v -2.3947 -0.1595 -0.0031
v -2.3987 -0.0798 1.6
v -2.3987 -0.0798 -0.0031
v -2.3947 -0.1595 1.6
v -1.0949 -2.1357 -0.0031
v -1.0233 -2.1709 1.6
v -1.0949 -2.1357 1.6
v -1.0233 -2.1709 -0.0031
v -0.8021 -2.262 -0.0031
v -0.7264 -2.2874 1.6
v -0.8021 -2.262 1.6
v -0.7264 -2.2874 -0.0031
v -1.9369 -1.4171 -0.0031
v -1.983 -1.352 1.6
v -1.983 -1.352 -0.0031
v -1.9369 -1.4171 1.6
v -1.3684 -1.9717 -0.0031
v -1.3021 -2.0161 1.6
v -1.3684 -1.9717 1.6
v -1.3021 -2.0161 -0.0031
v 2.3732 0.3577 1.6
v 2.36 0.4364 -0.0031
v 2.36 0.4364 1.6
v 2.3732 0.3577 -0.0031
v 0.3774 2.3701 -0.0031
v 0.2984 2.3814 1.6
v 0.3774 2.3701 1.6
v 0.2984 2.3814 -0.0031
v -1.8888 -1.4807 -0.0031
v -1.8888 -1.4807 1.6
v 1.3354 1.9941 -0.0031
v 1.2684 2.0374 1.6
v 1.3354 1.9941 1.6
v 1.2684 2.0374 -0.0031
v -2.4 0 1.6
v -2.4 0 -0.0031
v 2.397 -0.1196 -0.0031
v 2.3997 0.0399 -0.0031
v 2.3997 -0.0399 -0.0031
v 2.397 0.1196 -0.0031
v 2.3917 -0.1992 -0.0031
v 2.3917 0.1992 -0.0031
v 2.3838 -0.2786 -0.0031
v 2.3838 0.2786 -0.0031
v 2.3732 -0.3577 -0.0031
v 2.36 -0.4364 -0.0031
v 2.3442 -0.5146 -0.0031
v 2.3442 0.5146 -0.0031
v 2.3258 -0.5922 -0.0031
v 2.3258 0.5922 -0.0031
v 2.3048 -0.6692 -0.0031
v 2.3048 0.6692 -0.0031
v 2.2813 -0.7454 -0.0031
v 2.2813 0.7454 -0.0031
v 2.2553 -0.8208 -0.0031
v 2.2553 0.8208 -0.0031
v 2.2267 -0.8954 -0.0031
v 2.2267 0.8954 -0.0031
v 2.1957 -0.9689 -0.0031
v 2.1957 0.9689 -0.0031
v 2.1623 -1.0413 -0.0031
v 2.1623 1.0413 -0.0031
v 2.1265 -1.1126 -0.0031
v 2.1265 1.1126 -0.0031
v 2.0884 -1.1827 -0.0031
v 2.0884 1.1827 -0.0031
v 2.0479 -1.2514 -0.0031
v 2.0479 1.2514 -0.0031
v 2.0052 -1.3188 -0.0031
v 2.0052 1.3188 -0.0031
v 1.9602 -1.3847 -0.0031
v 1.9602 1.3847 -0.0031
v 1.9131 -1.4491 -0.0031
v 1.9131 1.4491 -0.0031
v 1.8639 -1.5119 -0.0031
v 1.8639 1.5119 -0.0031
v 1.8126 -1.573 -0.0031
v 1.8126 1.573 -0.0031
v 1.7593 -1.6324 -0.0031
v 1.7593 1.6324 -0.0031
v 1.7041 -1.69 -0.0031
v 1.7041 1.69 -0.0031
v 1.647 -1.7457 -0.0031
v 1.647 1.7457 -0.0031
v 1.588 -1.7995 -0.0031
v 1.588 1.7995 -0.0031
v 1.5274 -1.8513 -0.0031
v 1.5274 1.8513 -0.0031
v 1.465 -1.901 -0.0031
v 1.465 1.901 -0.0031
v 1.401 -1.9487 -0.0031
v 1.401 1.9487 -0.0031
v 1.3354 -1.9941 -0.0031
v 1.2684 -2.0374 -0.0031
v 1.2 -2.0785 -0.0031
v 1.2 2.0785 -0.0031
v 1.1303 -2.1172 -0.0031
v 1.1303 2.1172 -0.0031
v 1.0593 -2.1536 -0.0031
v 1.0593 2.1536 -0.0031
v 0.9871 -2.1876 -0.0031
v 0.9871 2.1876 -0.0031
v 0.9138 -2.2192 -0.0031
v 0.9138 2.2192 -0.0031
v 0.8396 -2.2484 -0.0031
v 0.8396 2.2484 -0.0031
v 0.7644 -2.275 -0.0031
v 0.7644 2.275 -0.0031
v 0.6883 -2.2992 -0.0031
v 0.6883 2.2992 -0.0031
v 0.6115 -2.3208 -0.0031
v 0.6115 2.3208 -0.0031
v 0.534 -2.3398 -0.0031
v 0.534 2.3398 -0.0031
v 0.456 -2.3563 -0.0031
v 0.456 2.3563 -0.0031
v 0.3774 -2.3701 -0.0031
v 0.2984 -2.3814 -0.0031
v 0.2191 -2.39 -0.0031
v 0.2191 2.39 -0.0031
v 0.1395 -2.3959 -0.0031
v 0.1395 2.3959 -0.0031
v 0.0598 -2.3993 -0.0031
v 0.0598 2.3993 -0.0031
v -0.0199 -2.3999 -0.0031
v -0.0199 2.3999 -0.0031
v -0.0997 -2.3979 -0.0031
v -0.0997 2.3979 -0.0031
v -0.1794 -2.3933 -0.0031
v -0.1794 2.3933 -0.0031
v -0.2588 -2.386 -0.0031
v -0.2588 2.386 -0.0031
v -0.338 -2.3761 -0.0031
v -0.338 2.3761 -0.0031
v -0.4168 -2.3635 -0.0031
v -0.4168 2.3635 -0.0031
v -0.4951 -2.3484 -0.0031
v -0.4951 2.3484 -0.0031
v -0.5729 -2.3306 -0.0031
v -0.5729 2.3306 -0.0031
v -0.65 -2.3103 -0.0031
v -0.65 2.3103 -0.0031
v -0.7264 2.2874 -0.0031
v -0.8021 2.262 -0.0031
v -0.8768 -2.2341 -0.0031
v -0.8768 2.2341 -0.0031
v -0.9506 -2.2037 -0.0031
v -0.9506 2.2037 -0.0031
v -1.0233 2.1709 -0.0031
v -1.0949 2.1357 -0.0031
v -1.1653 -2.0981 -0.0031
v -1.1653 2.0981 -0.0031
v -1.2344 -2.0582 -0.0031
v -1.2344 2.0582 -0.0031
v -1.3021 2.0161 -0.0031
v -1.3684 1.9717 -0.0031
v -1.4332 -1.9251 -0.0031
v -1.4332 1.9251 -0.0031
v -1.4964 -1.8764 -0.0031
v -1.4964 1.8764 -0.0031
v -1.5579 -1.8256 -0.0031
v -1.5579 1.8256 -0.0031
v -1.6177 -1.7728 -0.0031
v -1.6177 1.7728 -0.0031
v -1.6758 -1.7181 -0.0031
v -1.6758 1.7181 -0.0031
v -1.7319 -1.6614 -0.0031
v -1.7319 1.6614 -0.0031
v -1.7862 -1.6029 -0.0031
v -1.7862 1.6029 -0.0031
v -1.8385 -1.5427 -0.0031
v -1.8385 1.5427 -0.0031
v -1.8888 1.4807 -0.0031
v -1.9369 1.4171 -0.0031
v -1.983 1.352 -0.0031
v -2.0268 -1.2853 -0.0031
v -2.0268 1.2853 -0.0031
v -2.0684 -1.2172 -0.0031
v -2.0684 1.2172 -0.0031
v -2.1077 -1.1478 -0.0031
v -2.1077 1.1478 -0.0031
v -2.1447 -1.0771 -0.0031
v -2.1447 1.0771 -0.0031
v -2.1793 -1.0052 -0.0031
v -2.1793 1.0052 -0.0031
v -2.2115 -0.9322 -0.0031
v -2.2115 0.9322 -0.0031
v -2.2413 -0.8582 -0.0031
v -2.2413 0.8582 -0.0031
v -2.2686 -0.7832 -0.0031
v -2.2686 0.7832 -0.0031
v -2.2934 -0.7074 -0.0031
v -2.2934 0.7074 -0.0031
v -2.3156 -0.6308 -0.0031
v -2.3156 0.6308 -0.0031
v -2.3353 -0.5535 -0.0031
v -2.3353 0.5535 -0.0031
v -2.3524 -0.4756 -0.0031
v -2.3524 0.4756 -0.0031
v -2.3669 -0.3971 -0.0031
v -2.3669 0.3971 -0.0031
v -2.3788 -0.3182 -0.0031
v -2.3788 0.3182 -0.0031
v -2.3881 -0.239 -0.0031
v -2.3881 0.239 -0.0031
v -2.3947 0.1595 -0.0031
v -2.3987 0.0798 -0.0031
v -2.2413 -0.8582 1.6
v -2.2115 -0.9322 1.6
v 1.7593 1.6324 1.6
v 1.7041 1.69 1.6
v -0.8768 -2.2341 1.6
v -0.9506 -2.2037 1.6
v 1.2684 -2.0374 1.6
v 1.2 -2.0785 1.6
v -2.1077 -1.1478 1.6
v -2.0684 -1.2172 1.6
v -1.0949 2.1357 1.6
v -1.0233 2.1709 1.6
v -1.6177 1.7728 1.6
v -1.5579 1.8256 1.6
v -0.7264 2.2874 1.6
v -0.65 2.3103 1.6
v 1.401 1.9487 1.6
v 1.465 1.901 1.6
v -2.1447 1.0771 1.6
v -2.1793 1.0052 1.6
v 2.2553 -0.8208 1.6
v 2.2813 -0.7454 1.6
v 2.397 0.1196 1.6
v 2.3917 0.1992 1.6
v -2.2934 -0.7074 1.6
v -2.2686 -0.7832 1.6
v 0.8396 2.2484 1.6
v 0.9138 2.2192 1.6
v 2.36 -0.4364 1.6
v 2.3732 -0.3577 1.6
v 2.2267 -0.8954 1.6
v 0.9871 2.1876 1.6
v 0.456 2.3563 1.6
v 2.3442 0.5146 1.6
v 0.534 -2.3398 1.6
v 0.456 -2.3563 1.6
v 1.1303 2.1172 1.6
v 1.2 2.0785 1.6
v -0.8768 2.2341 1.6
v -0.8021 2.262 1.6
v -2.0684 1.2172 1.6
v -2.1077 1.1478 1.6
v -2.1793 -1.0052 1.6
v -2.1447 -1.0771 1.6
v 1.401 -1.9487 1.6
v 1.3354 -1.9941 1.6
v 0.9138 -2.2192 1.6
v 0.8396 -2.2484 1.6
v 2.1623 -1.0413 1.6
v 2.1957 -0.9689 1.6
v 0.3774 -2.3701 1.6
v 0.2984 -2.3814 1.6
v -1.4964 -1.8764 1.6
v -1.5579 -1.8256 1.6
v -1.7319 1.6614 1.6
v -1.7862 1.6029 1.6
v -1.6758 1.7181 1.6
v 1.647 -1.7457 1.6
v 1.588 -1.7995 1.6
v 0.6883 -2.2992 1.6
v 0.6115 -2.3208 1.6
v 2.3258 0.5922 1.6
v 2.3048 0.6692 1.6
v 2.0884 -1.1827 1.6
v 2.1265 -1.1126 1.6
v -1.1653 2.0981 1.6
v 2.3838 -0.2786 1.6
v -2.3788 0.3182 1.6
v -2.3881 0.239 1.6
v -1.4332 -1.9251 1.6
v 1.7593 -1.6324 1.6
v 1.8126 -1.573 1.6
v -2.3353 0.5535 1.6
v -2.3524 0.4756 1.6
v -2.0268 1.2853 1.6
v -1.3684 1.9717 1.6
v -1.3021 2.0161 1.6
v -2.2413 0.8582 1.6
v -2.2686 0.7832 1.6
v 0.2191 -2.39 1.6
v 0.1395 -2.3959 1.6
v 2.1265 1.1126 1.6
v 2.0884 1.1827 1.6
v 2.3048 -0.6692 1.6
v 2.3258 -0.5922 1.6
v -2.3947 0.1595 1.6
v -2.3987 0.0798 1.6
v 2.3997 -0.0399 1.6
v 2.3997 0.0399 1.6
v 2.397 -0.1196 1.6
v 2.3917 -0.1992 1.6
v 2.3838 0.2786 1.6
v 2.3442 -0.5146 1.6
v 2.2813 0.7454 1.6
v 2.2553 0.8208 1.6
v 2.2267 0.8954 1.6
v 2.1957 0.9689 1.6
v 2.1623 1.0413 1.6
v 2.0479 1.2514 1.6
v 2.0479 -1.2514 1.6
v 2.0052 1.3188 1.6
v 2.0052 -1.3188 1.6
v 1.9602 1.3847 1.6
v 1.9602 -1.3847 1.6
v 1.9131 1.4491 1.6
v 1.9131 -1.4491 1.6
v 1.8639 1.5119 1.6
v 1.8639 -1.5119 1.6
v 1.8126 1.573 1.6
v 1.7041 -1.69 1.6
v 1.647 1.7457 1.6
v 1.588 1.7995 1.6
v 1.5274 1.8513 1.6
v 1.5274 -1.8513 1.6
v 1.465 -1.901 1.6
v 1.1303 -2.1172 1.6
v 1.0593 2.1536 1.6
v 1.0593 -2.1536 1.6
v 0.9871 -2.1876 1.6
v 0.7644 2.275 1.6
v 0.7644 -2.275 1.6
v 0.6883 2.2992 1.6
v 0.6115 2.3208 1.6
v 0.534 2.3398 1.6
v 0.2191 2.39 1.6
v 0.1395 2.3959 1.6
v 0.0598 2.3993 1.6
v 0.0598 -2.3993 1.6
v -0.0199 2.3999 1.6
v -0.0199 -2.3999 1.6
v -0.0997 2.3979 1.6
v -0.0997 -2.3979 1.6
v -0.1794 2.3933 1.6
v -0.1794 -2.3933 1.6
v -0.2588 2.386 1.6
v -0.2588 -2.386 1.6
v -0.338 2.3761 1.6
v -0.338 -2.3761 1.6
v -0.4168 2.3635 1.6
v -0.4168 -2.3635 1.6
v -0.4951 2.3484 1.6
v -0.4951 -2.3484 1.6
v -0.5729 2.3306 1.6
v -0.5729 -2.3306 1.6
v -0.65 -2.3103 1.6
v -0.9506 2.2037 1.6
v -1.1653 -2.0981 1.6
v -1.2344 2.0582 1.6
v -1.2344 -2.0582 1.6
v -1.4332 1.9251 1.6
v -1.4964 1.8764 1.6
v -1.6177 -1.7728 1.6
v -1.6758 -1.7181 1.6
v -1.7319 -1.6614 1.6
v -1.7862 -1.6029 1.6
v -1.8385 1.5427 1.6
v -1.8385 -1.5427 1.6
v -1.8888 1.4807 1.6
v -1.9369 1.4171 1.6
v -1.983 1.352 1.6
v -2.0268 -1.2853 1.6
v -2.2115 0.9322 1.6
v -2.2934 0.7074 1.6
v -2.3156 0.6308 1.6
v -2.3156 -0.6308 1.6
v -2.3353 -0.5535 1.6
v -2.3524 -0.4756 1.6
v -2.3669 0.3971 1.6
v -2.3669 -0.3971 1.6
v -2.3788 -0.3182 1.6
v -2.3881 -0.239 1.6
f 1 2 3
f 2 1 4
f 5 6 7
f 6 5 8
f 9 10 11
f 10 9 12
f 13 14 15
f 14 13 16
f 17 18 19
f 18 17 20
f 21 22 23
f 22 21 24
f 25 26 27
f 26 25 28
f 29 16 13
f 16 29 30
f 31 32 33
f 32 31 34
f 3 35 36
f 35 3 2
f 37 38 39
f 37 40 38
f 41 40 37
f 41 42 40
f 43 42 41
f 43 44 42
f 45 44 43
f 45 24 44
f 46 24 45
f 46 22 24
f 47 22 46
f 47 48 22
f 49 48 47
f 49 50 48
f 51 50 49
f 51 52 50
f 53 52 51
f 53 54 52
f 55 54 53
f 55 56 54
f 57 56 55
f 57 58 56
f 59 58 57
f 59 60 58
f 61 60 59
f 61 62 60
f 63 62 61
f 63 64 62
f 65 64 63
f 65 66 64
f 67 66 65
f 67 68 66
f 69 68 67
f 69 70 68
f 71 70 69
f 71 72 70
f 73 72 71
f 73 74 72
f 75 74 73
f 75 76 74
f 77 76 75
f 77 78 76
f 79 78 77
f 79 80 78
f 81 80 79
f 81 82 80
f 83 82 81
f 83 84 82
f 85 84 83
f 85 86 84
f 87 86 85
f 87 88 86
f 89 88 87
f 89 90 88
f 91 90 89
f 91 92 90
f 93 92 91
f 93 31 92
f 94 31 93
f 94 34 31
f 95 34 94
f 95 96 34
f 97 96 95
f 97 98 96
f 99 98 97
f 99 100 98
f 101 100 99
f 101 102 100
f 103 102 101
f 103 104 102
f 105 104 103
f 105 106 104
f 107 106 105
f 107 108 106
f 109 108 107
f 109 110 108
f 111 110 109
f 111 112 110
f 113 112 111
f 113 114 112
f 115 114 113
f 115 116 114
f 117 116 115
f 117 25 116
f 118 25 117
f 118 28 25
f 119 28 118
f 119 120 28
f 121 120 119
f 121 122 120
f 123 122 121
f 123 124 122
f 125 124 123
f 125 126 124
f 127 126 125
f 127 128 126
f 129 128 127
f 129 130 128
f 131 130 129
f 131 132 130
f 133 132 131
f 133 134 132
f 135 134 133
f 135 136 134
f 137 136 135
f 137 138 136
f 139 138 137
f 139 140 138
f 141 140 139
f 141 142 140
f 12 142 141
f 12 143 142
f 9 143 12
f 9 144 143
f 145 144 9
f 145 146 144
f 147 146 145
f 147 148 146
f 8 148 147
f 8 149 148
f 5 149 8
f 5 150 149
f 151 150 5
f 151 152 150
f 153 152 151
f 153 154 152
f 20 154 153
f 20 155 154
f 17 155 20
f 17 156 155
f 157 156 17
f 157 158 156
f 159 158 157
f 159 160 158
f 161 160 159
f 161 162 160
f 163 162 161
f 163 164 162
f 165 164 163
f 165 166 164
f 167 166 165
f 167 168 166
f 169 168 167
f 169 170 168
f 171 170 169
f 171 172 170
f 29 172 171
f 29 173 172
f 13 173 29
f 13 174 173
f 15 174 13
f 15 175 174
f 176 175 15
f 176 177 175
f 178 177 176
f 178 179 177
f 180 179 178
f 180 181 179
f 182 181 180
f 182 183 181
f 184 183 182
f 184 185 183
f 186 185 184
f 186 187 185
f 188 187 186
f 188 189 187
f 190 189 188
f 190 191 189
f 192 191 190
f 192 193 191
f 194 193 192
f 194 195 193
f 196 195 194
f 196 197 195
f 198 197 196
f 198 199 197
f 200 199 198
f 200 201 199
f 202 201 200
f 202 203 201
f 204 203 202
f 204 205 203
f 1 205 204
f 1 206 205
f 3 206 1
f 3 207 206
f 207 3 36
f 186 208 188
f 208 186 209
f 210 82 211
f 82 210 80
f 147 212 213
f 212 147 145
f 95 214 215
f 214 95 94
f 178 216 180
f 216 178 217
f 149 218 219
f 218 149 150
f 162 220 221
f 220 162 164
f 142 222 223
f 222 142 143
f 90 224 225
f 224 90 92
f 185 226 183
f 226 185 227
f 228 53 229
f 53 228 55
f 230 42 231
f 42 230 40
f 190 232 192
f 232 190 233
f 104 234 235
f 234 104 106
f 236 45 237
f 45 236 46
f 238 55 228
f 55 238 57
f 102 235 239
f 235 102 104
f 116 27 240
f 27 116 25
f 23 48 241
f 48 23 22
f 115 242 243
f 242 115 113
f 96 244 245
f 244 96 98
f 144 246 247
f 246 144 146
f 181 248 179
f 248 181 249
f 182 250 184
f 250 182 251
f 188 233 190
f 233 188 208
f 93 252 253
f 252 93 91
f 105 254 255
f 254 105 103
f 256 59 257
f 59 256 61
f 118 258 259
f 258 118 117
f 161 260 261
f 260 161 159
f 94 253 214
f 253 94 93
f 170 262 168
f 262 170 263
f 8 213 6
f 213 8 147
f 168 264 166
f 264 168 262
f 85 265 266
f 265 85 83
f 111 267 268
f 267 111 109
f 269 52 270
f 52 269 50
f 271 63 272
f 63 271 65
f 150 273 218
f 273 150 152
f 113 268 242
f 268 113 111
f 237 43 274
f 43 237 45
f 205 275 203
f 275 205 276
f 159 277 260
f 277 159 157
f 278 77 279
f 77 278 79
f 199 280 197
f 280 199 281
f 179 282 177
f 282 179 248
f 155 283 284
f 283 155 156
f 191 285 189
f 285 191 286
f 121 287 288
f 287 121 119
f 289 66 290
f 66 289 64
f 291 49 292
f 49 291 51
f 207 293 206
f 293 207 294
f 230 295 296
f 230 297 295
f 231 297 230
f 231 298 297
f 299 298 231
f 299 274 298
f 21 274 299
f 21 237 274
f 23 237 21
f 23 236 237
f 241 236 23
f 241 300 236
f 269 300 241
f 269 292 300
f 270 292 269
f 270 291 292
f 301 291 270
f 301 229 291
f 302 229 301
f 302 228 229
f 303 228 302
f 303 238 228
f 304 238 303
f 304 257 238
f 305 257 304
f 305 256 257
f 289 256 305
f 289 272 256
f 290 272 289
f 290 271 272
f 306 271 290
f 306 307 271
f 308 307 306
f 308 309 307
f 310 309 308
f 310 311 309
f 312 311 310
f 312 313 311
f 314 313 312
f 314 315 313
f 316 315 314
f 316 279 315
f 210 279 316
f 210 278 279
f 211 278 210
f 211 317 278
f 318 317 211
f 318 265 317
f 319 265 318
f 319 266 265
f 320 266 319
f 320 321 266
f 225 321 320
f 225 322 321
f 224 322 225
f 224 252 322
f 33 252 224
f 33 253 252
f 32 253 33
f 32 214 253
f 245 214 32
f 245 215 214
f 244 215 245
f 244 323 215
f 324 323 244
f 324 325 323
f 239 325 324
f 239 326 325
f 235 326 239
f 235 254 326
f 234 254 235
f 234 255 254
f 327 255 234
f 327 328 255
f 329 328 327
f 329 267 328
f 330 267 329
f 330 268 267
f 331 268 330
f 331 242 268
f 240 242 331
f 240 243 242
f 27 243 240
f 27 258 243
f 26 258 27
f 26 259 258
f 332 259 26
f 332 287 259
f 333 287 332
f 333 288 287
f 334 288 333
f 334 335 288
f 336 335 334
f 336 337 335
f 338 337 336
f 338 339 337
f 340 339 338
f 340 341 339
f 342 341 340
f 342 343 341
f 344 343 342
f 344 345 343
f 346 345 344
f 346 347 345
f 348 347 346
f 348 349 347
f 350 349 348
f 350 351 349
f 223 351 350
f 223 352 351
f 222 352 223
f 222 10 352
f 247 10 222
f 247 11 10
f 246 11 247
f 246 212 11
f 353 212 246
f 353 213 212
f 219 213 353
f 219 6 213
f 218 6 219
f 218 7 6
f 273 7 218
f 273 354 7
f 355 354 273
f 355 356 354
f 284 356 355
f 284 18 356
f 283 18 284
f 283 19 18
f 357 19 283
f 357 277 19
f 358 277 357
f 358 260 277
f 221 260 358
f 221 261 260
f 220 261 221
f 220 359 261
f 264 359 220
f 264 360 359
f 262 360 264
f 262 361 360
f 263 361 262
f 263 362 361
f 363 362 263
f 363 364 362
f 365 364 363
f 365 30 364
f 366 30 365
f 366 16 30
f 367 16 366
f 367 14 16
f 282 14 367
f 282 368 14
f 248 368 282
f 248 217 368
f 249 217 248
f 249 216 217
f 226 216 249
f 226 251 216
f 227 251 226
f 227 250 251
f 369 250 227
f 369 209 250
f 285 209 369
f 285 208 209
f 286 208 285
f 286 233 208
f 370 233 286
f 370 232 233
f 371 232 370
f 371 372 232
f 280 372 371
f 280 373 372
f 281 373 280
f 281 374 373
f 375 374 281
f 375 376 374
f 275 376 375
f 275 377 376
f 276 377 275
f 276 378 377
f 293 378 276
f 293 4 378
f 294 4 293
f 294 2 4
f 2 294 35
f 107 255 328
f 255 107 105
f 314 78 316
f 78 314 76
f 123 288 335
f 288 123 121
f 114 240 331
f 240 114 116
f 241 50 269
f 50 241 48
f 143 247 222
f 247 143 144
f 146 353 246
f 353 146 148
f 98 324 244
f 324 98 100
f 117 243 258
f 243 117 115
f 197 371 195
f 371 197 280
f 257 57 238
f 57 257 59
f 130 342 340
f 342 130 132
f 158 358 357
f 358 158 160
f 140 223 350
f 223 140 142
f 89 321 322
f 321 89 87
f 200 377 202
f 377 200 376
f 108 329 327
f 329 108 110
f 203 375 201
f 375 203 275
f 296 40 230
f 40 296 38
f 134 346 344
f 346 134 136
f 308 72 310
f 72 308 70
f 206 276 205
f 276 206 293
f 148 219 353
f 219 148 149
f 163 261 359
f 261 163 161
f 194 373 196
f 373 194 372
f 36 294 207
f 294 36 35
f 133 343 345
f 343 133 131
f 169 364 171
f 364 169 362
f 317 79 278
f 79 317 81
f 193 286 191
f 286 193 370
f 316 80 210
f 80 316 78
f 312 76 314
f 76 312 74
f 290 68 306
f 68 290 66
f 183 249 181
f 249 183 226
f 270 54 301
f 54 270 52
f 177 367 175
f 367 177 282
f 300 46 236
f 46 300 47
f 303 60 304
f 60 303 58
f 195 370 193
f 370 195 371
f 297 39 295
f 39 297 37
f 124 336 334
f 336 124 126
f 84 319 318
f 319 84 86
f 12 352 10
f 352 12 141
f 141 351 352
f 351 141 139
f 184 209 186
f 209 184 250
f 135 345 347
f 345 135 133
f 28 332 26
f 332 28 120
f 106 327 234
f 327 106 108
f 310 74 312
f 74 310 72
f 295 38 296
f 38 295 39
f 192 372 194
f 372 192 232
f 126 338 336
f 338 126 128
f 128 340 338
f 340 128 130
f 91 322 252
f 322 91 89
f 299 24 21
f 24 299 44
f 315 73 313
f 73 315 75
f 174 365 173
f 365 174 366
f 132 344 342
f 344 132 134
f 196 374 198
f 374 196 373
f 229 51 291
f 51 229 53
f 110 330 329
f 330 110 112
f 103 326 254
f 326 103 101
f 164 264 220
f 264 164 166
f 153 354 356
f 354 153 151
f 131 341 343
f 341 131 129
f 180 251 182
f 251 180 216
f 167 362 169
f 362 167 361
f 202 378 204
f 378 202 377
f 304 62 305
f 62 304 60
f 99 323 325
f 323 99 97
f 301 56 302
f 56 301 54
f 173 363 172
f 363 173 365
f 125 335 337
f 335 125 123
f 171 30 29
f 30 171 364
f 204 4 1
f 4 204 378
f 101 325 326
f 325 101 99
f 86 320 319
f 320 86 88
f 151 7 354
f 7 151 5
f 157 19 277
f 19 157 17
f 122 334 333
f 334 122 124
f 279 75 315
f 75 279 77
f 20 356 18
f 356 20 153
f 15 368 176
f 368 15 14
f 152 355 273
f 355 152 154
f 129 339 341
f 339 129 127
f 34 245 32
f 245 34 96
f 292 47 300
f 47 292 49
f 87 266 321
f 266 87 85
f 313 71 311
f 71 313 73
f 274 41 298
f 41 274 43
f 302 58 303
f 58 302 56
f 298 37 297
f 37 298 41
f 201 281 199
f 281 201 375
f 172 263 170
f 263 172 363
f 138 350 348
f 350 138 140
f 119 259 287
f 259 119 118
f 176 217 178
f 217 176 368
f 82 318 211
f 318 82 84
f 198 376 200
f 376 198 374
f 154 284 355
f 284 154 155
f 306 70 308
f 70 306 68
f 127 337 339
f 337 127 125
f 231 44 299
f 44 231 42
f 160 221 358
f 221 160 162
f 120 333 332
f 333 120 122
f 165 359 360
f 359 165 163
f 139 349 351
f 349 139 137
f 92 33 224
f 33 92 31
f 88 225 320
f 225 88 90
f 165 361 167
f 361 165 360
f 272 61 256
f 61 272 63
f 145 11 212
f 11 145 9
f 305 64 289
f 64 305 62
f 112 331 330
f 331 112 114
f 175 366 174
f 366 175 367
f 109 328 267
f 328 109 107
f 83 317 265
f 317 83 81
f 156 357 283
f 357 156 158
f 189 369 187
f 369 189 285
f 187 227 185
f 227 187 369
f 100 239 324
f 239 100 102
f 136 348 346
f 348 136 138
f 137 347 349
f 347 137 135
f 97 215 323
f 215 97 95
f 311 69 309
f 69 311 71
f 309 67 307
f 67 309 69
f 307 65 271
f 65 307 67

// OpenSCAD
// file: ../p/stud3.scad
use <../lib.scad>
use <4-4cyli.scad>
use <4-4disc.scad>
use <4-4edge.scad>
$fa=1; $fs=0.2;
function ldraw_lib__stud3(realsolid=false) = realsolid ? 
    [openscad(translate([0,0,-eps()], o=cylinder(4+eps(), r=4)),2)] : [
// 0 Stud Tube Solid
// 0 Name: stud3.dat
// 0 Author: James Jessiman
// 0 !LDRAW_ORG Primitive UPDATE 2012-01
// 0 !LICENSE Licensed under CC BY 2.0 and CC BY 4.0 : see CAreadme.txt
// 
// 0 BFC CERTIFY CCW
  [0,"BFC","CERTIFY"],
  [0,"BFC","CCW"],
// 
// 0 !HISTORY 2002-04-04 [sbliss] Modified for BFC compliance
// 0 !HISTORY 2002-04-25 [PTadmin] Official Update 2002-02
// 0 !HISTORY 2007-06-24 [PTadmin] Header formatted for Contributor Agreement
// 0 !HISTORY 2008-07-01 [PTadmin] Official Update 2008-01
// 0 !HISTORY 2012-02-16 [Philo] Changed to CCW
// 0 !HISTORY 2012-03-30 [PTadmin] Official Update 2012-01
// 
// 
// 1 16 0 -4 0 4 0 0 0 1 0 0 0 4 4-4edge.dat
  [1,16,0,-4,0,4,0,0,0,1,0,0,0,4, ldraw_lib__4_4edge(realsolid)],
// 1 16 0 0 0 4 0 0 0 1 0 0 0 4 4-4edge.dat
  [1,16,0,0,0,4,0,0,0,1,0,0,0,4, ldraw_lib__4_4edge(realsolid)],
// 1 16 0 -4 0 4 0 0 0 1 0 0 0 4 4-4disc.dat
  [1,16,0,-4,0,4,0,0,0,1,0,0,0,4, ldraw_lib__4_4disc(realsolid)],
// 1 16 0 -4 0 4 0 0 0 4 0 0 0 4 4-4cyli.dat
  [1,16,0,-4,0,4,0,0,0,4,0,0,0,4, ldraw_lib__4_4cyli(realsolid)],
];
module ldraw_lib__stud3(step=0, col=false, unit=2/5, alt=false, line=0.2, solid=!$preview)
    makepoly(ldraw_lib__stud3(solid), step=step, col=col, unit=unit, alt=alt, line=line, solid=solid);
ldraw_lib__stud3(line=0.2);
// file: ../p/4-4edge.scad
use <../lib.scad>
$fa=1; $fs=0.2;
function ldraw_lib__4_4edge(realsolid=false) = [
// 0 Circle 1.0
// 0 Name: 4-4edge.dat
// 0 Author: James Jessiman
// 0 !LDRAW_ORG Primitive UPDATE 2017-01
// 0 !LICENSE Licensed under CC BY 2.0 and CC BY 4.0 : see CAreadme.txt
// 
// 0 BFC CERTIFY CCW
  [0,"BFC","CERTIFY"],
  [0,"BFC","CCW"],
// 
// 0 !HISTORY 1998-12-15 [PTadmin] Official Update 1998-10
// 0 !HISTORY 2005-12-28 [PTadmin] Official Update 2005-01
// 0 !HISTORY 2007-06-24 [PTadmin] Header formatted for Contributor Agreement
// 0 !HISTORY 2008-07-01 [PTadmin] Official Update 2008-01
// 0 !HISTORY 2017-01-15 [Steffen] BFCed
// 0 !HISTORY 2017-12-30 [PTadmin] Official Update 2017-01
// 
// 
// 2 24 1 0 0 0.9239 0 0.3827
  [2,24,1,0,0,0.9239,0,0.3827],
// 2 24 0.9239 0 0.3827 0.7071 0 0.7071
  [2,24,0.9239,0,0.3827,0.7071,0,0.7071],
// 2 24 0.7071 0 0.7071 0.3827 0 0.9239
  [2,24,0.7071,0,0.7071,0.3827,0,0.9239],
// 2 24 0.3827 0 0.9239 0 0 1
  [2,24,0.3827,0,0.9239,0,0,1],
// 2 24 0 0 1 -0.3827 0 0.9239
  [2,24,0,0,1,-0.3827,0,0.9239],
// 2 24 -0.3827 0 0.9239 -0.7071 0 0.7071
  [2,24,-0.3827,0,0.9239,-0.7071,0,0.7071],
// 2 24 -0.7071 0 0.7071 -0.9239 0 0.3827
  [2,24,-0.7071,0,0.7071,-0.9239,0,0.3827],
// 2 24 -0.9239 0 0.3827 -1 0 -0
  [2,24,-0.9239,0,0.3827,-1,0,-0],
// 2 24 -1 0 -0 -0.9239 0 -0.3827
  [2,24,-1,0,-0,-0.9239,0,-0.3827],
// 2 24 -0.9239 0 -0.3827 -0.7071 0 -0.7071
  [2,24,-0.9239,0,-0.3827,-0.7071,0,-0.7071],
// 2 24 -0.7071 0 -0.7071 -0.3827 0 -0.9239
  [2,24,-0.7071,0,-0.7071,-0.3827,0,-0.9239],
// 2 24 -0.3827 0 -0.9239 0 0 -1
  [2,24,-0.3827,0,-0.9239,0,0,-1],
// 2 24 0 0 -1 0.3827 0 -0.9239
  [2,24,0,0,-1,0.3827,0,-0.9239],
// 2 24 0.3827 0 -0.9239 0.7071 0 -0.7071
  [2,24,0.3827,0,-0.9239,0.7071,0,-0.7071],
// 2 24 0.7071 0 -0.7071 0.9239 0 -0.3827
  [2,24,0.7071,0,-0.7071,0.9239,0,-0.3827],
// 2 24 0.9239 0 -0.3827 1 0 0
  [2,24,0.9239,0,-0.3827,1,0,0],
];
module ldraw_lib__4_4edge(step=0, col=false, unit=2/5, alt=false, line=0.2, solid=!$preview)
    makepoly(ldraw_lib__4_4edge(solid), step=step, col=col, unit=unit, alt=alt, line=line, solid=solid);
ldraw_lib__4_4edge(line=0.2);
// file: ../p/4-4disc.scad
use <../lib.scad>
$fa=1; $fs=0.2;
function ldraw_lib__4_4disc(realsolid=false) = [
// 0 Disc 1.0
// 0 Name: 4-4disc.dat
// 0 Author: James Jessiman
// 0 !LDRAW_ORG Primitive UPDATE 2002-02
// 0 !LICENSE Licensed under CC BY 2.0 and CC BY 4.0 : see CAreadme.txt
// 
// 0 BFC CERTIFY CCW
  [0,"BFC","CERTIFY"],
  [0,"BFC","CCW"],
// 
// 0 !HISTORY 1998-12-15 [PTadmin] Official Update 1998-10
// 0 !HISTORY 2002-03-23 [sbliss] Added BFC statement
// 0 !HISTORY 2002-04-25 [PTadmin] Official Update 2002-02
// 0 !HISTORY 2007-06-24 [PTadmin] Header formatted for Contributor Agreement
// 0 !HISTORY 2008-07-01 [PTadmin] Official Update 2008-01
// 
// 
// 3 16 0 0 0 1 0 0 0.9239 0 0.3827
  [3,16,0,0,0,1,0,0,0.9239,0,0.3827],
// 3 16 0 0 0 0.9239 0 0.3827 0.7071 0 0.7071
  [3,16,0,0,0,0.9239,0,0.3827,0.7071,0,0.7071],
// 3 16 0 0 0 0.7071 0 0.7071 0.3827 0 0.9239
  [3,16,0,0,0,0.7071,0,0.7071,0.3827,0,0.9239],
// 3 16 0 0 0 0.3827 0 0.9239 0 0 1
  [3,16,0,0,0,0.3827,0,0.9239,0,0,1],
// 3 16 0 0 0 0 0 1 -0.3827 0 0.9239
  [3,16,0,0,0,0,0,1,-0.3827,0,0.9239],
// 3 16 0 0 0 -0.3827 0 0.9239 -0.7071 0 0.7071
  [3,16,0,0,0,-0.3827,0,0.9239,-0.7071,0,0.7071],
// 3 16 0 0 0 -0.7071 0 0.7071 -0.9239 0 0.3827
  [3,16,0,0,0,-0.7071,0,0.7071,-0.9239,0,0.3827],
// 3 16 0 0 0 -0.9239 0 0.3827 -1 0 -0
  [3,16,0,0,0,-0.9239,0,0.3827,-1,0,-0],
// 3 16 0 0 0 -1 0 -0 -0.9239 0 -0.3827
  [3,16,0,0,0,-1,0,-0,-0.9239,0,-0.3827],
// 3 16 0 0 0 -0.9239 0 -0.3827 -0.7071 0 -0.7071
  [3,16,0,0,0,-0.9239,0,-0.3827,-0.7071,0,-0.7071],
// 3 16 0 0 0 -0.7071 0 -0.7071 -0.3827 0 -0.9239
  [3,16,0,0,0,-0.7071,0,-0.7071,-0.3827,0,-0.9239],
// 3 16 0 0 0 -0.3827 0 -0.9239 0 0 -1
  [3,16,0,0,0,-0.3827,0,-0.9239,0,0,-1],
// 3 16 0 0 0 0 0 -1 0.3827 0 -0.9239
  [3,16,0,0,0,0,0,-1,0.3827,0,-0.9239],
// 3 16 0 0 0 0.3827 0 -0.9239 0.7071 0 -0.7071
  [3,16,0,0,0,0.3827,0,-0.9239,0.7071,0,-0.7071],
// 3 16 0 0 0 0.7071 0 -0.7071 0.9239 0 -0.3827
  [3,16,0,0,0,0.7071,0,-0.7071,0.9239,0,-0.3827],
// 3 16 0 0 0 0.9239 0 -0.3827 1 0 0
  [3,16,0,0,0,0.9239,0,-0.3827,1,0,0],
// 0
];
module ldraw_lib__4_4disc(step=0, col=false, unit=2/5, alt=false, line=0.2, solid=!$preview)
    makepoly(ldraw_lib__4_4disc(solid), step=step, col=col, unit=unit, alt=alt, line=line, solid=solid);
ldraw_lib__4_4disc(line=0.2);
// file: ../p/4-4cyli.scad
use <../lib.scad>
$fa=1; $fs=0.2;
function ldraw_lib__4_4cyli(realsolid=false) = [
// 0 Cylinder 1.0
// 0 Name: 4-4cyli.dat
// 0 Author: James Jessiman
// 0 !LDRAW_ORG Primitive UPDATE 2005-01
// 0 !LICENSE Licensed under CC BY 2.0 and CC BY 4.0 : see CAreadme.txt
// 
// 0 BFC CERTIFY CCW
  [0,"BFC","CERTIFY"],
  [0,"BFC","CCW"],
// 
// 0 !HISTORY 1998-12-15 [PTadmin] Official Update 1998-10
// 0 !HISTORY 2002-03-23 [sbliss] Added BFC statement; merged headers from files in distributions LDraw 0.27 and Complete.
// 0 !HISTORY 2002-04-25 [PTadmin] Official Update 2002-02
// 0 !HISTORY 2004-12-14 [guyvivan] BFC CCW
// 0 !HISTORY 2005-12-28 [PTadmin] Official Update 2005-01
// 0 !HISTORY 2007-06-24 [PTadmin] Header formatted for Contributor Agreement
// 0 !HISTORY 2008-07-01 [PTadmin] Official Update 2008-01
// 
// 
// 4 16 1 1 0 0.9239 1 0.3827 0.9239 0 0.3827 1 0 0
  [4,16,1,1,0,0.9239,1,0.3827,0.9239,0,0.3827,1,0,0],
// 5 24 1 0 0 1 1 0 0.9239 0 0.3827 0.9239 0 -0.3827
  [5,24,1,0,0,1,1,0,0.9239,0,0.3827,0.9239,0,-0.3827],
// 4 16 0.9239 1 0.3827 0.7071 1 0.7071 0.7071 0 0.7071 0.9239 0 0.3827
  [4,16,0.9239,1,0.3827,0.7071,1,0.7071,0.7071,0,0.7071,0.9239,0,0.3827],
// 5 24 0.9239 0 0.3827 0.9239 1 0.3827 0.7071 0 0.7071 1 0 0
  [5,24,0.9239,0,0.3827,0.9239,1,0.3827,0.7071,0,0.7071,1,0,0],
// 4 16 0.7071 1 0.7071 0.3827 1 0.9239 0.3827 0 0.9239 0.7071 0 0.7071
  [4,16,0.7071,1,0.7071,0.3827,1,0.9239,0.3827,0,0.9239,0.7071,0,0.7071],
// 5 24 0.7071 0 0.7071 0.7071 1 0.7071 0.3827 0 0.9239 0.9239 0 0.3827
  [5,24,0.7071,0,0.7071,0.7071,1,0.7071,0.3827,0,0.9239,0.9239,0,0.3827],
// 4 16 0.3827 1 0.9239 0 1 1 0 0 1 0.3827 0 0.9239
  [4,16,0.3827,1,0.9239,0,1,1,0,0,1,0.3827,0,0.9239],
// 5 24 0.3827 0 0.9239 0.3827 1 0.9239 0 0 1 0.7071 0 0.7071
  [5,24,0.3827,0,0.9239,0.3827,1,0.9239,0,0,1,0.7071,0,0.7071],
// 4 16 0 1 1 -0.3827 1 0.9239 -0.3827 0 0.9239 0 0 1
  [4,16,0,1,1,-0.3827,1,0.9239,-0.3827,0,0.9239,0,0,1],
// 5 24 0 0 1 0 1 1 -0.3827 0 0.9239 0.3827 0 0.9239
  [5,24,0,0,1,0,1,1,-0.3827,0,0.9239,0.3827,0,0.9239],
// 4 16 -0.3827 1 0.9239 -0.7071 1 0.7071 -0.7071 0 0.7071 -0.3827 0 0.9239
  [4,16,-0.3827,1,0.9239,-0.7071,1,0.7071,-0.7071,0,0.7071,-0.3827,0,0.9239],
// 5 24 -0.3827 0 0.9239 -0.3827 1 0.9239 -0.7071 0 0.7071 0 0 1
  [5,24,-0.3827,0,0.9239,-0.3827,1,0.9239,-0.7071,0,0.7071,0,0,1],
// 4 16 -0.7071 1 0.7071 -0.9239 1 0.3827 -0.9239 0 0.3827 -0.7071 0 0.7071
  [4,16,-0.7071,1,0.7071,-0.9239,1,0.3827,-0.9239,0,0.3827,-0.7071,0,0.7071],
// 5 24 -0.7071 0 0.7071 -0.7071 1 0.7071 -0.9239 0 0.3827 -0.3827 0 0.9239
  [5,24,-0.7071,0,0.7071,-0.7071,1,0.7071,-0.9239,0,0.3827,-0.3827,0,0.9239],
// 4 16 -0.9239 1 0.3827 -1 1 0 -1 0 0 -0.9239 0 0.3827
  [4,16,-0.9239,1,0.3827,-1,1,0,-1,0,0,-0.9239,0,0.3827],
// 5 24 -0.9239 0 0.3827 -0.9239 1 0.3827 -1 0 0 -0.7071 0 0.7071
  [5,24,-0.9239,0,0.3827,-0.9239,1,0.3827,-1,0,0,-0.7071,0,0.7071],
// 4 16 -1 1 0 -0.9239 1 -0.3827 -0.9239 0 -0.3827 -1 0 0
  [4,16,-1,1,0,-0.9239,1,-0.3827,-0.9239,0,-0.3827,-1,0,0],
// 5 24 -1 0 0 -1 1 0 -0.9239 0 -0.3827 -0.9239 0 0.3827
  [5,24,-1,0,0,-1,1,0,-0.9239,0,-0.3827,-0.9239,0,0.3827],
// 4 16 -0.9239 1 -0.3827 -0.7071 1 -0.7071 -0.7071 0 -0.7071 -0.9239 0 -0.3827
  [4,16,-0.9239,1,-0.3827,-0.7071,1,-0.7071,-0.7071,0,-0.7071,-0.9239,0,-0.3827],
// 5 24 -0.9239 0 -0.3827 -0.9239 1 -0.3827 -0.7071 0 -0.7071 -1 0 0
  [5,24,-0.9239,0,-0.3827,-0.9239,1,-0.3827,-0.7071,0,-0.7071,-1,0,0],
// 4 16 -0.7071 1 -0.7071 -0.3827 1 -0.9239 -0.3827 0 -0.9239 -0.7071 0 -0.7071
  [4,16,-0.7071,1,-0.7071,-0.3827,1,-0.9239,-0.3827,0,-0.9239,-0.7071,0,-0.7071],
// 5 24 -0.7071 0 -0.7071 -0.7071 1 -0.7071 -0.3827 0 -0.9239 -0.9239 0 -0.3827
  [5,24,-0.7071,0,-0.7071,-0.7071,1,-0.7071,-0.3827,0,-0.9239,-0.9239,0,-0.3827],
// 4 16 -0.3827 1 -0.9239 0 1 -1 0 0 -1 -0.3827 0 -0.9239
  [4,16,-0.3827,1,-0.9239,0,1,-1,0,0,-1,-0.3827,0,-0.9239],
// 5 24 -0.3827 0 -0.9239 -0.3827 1 -0.9239 0 0 -1 -0.7071 0 -0.7071
  [5,24,-0.3827,0,-0.9239,-0.3827,1,-0.9239,0,0,-1,-0.7071,0,-0.7071],
// 4 16 0 1 -1 0.3827 1 -0.9239 0.3827 0 -0.9239 0 0 -1
  [4,16,0,1,-1,0.3827,1,-0.9239,0.3827,0,-0.9239,0,0,-1],
// 5 24 0 0 -1 0 1 -1 0.3827 0 -0.9239 -0.3827 0 -0.9239
  [5,24,0,0,-1,0,1,-1,0.3827,0,-0.9239,-0.3827,0,-0.9239],
// 4 16 0.3827 1 -0.9239 0.7071 1 -0.7071 0.7071 0 -0.7071 0.3827 0 -0.9239
  [4,16,0.3827,1,-0.9239,0.7071,1,-0.7071,0.7071,0,-0.7071,0.3827,0,-0.9239],
// 5 24 0.3827 0 -0.9239 0.3827 1 -0.9239 0.7071 0 -0.7071 0 0 -1
  [5,24,0.3827,0,-0.9239,0.3827,1,-0.9239,0.7071,0,-0.7071,0,0,-1],
// 4 16 0.7071 1 -0.7071 0.9239 1 -0.3827 0.9239 0 -0.3827 0.7071 0 -0.7071
  [4,16,0.7071,1,-0.7071,0.9239,1,-0.3827,0.9239,0,-0.3827,0.7071,0,-0.7071],
// 5 24 0.7071 0 -0.7071 0.7071 1 -0.7071 0.9239 0 -0.3827 0.3827 0 -0.9239
  [5,24,0.7071,0,-0.7071,0.7071,1,-0.7071,0.9239,0,-0.3827,0.3827,0,-0.9239],
// 4 16 0.9239 1 -0.3827 1 1 0 1 0 0 0.9239 0 -0.3827
  [4,16,0.9239,1,-0.3827,1,1,0,1,0,0,0.9239,0,-0.3827],
// 5 24 0.9239 0 -0.3827 0.9239 1 -0.3827 1 0 0 0.7071 0 -0.7071
  [5,24,0.9239,0,-0.3827,0.9239,1,-0.3827,1,0,0,0.7071,0,-0.7071],
// 0
];
module ldraw_lib__4_4cyli(step=0, col=false, unit=2/5, alt=false, line=0.2, solid=!$preview)
    makepoly(ldraw_lib__4_4cyli(solid), step=step, col=col, unit=unit, alt=alt, line=line, solid=solid);
ldraw_lib__4_4cyli(line=0.2);
// file: s/3004s01.scad
use <../../lib.scad>
use <../../p/box4t.scad>
use <../../p/box5.scad>
use <../../p/stud.scad>
use <../../p/stud3.scad>
$fa=1; $fs=0.2;
function ldraw_lib__s__3004s01(realsolid=false) = [
// 0 ~Brick  1 x  2 without Front Face
// 0 Name: s\3004s01.dat
// 0 Author: James Jessiman
// 0 !LDRAW_ORG Subpart UPDATE 2003-03
// 0 !LICENSE Licensed under CC BY 2.0 and CC BY 4.0 : see CAreadme.txt
// 
// 0 BFC CERTIFY CCW
  [0,"BFC","CERTIFY"],
  [0,"BFC","CCW"],
// 
// 0 !HISTORY 2003-09-07 [jriley] Subfiling, BFC
// 0 !HISTORY 2003-12-19 [PTadmin] Official Update 2003-03
// 0 !HISTORY 2007-08-29 [PTadmin] Header formatted for Contributor Agreement
// 0 !HISTORY 2008-07-01 [PTadmin] Official Update 2008-01
// 
// 
// 1 16 0 4 0 1 0 0 0 -5 0 0 0 1 stud3.dat
  [1,16,0,4,0,1,0,0,0,-5,0,0,0,1, ldraw_lib__stud3(realsolid)],
// 0 BFC INVERTNEXT
  [0,"BFC","INVERTNEXT"],
// 1 16 0 24 0 16 0 0 0 -20 0 0 0 6 box5.dat
  [1,16,0,24,0,16,0,0,0,-20,0,0,0,6, ldraw_lib__box5(realsolid)],
// 4 16 20 24 10 16 24 6 -16 24 6 -20 24 10
  [4,16,20,24,10,16,24,6,-16,24,6,-20,24,10],
// 4 16 -20 24 10 -16 24 6 -16 24 -6 -20 24 -10
  [4,16,-20,24,10,-16,24,6,-16,24,-6,-20,24,-10],
// 4 16 -20 24 -10 -16 24 -6 16 24 -6 20 24 -10
  [4,16,-20,24,-10,-16,24,-6,16,24,-6,20,24,-10],
// 4 16 20 24 -10 16 24 -6 16 24 6 20 24 10
  [4,16,20,24,-10,16,24,-6,16,24,6,20,24,10],
// 1 16 0 24 0 20 0 0 0 -24 0 0 0 10 box4t.dat
  [1,16,0,24,0,20,0,0,0,-24,0,0,0,10, ldraw_lib__box4t(realsolid)],
// 1 16 10 0 0 1 0 0 0 1 0 0 0 1 stud.dat
  [1,16,10,0,0,1,0,0,0,1,0,0,0,1, ldraw_lib__stud(realsolid)],
// 1 16 -10 0 0 1 0 0 0 1 0 0 0 1 stud.dat
  [1,16,-10,0,0,1,0,0,0,1,0,0,0,1, ldraw_lib__stud(realsolid)],
// 0
];
module ldraw_lib__s__3004s01(step=0, col=false, unit=2/5, alt=false, line=0.2, solid=!$preview)
    makepoly(ldraw_lib__s__3004s01(solid), step=step, col=col, unit=unit, alt=alt, line=line, solid=solid);
ldraw_lib__s__3004s01(line=0.2);
// file: ../p/stud.scad
use <../lib.scad>
use <4-4cyli.scad>
use <4-4disc.scad>
use <4-4edge.scad>
$fa=1; $fs=0.2;
function ldraw_lib__stud(realsolid=false) = realsolid ? 
    [openscad(translate([0,0,-eps()], o=cylinder(4+eps(), r=6)),2)] : [
// 0 Stud
// 0 Name: stud.dat
// 0 Author: James Jessiman
// 0 !LDRAW_ORG Primitive UPDATE 2012-01
// 0 !LICENSE Licensed under CC BY 2.0 and CC BY 4.0 : see CAreadme.txt
// 
// 0 BFC CERTIFY CCW
  [0,"BFC","CERTIFY"],
  [0,"BFC","CCW"],
// 
// 0 !HISTORY 2002-04-04 [sbliss] Modified for BFC compliance
// 0 !HISTORY 2002-04-25 [PTadmin] Official Update 2002-02
// 0 !HISTORY 2007-06-24 [PTadmin] Header formatted for Contributor Agreement
// 0 !HISTORY 2008-07-01 [PTadmin] Official Update 2008-01
// 0 !HISTORY 2012-02-16 [Philo] Changed to CCW
// 0 !HISTORY 2012-03-30 [PTadmin] Official Update 2012-01
// 
// 
// 1 16 0 0 0 6 0 0 0 1 0 0 0 6 4-4edge.dat
  [1,16,0,0,0,6,0,0,0,1,0,0,0,6, ldraw_lib__4_4edge(realsolid)],
// 1 16 0 -4 0 6 0 0 0 1 0 0 0 6 4-4edge.dat
  [1,16,0,-4,0,6,0,0,0,1,0,0,0,6, ldraw_lib__4_4edge(realsolid)],
// 1 16 0 0 0 6 0 0 0 -4 0 0 0 6 4-4cyli.dat
  [1,16,0,0,0,6,0,0,0,-4,0,0,0,6, ldraw_lib__4_4cyli(realsolid)],
// 1 16 0 -4 0 6 0 0 0 1 0 0 0 6 4-4disc.dat
  [1,16,0,-4,0,6,0,0,0,1,0,0,0,6, ldraw_lib__4_4disc(realsolid)],
];
module ldraw_lib__stud(step=0, col=false, unit=2/5, alt=false, line=0.2, solid=!$preview)
    makepoly(ldraw_lib__stud(solid), step=step, col=col, unit=unit, alt=alt, line=line, solid=solid);
ldraw_lib__stud(line=0.2);
// file: ../p/box5.scad
use <../lib.scad>
$fa=1; $fs=0.2;
function ldraw_lib__box5(realsolid=false) = [
// 0 Box with 5 Faces and All Edges
// 0 Name: box5.dat
// 0 Author: James Jessiman
// 0 !LDRAW_ORG Primitive UPDATE 2012-01
// 0 !LICENSE Licensed under CC BY 2.0 and CC BY 4.0 : see CAreadme.txt
// 
// 0 BFC CERTIFY CCW
  [0,"BFC","CERTIFY"],
  [0,"BFC","CCW"],
// 
// 0 !HISTORY 2002-04-03 [sbliss] Modified for BFC compliance
// 0 !HISTORY 2002-04-25 [PTadmin] Official Update 2002-02
// 0 !HISTORY 2007-06-24 [PTadmin] Header formatted for Contributor Agreement
// 0 !HISTORY 2008-07-01 [PTadmin] Official Update 2008-01
// 0 !HISTORY 2012-02-16 [Philo] Changed to CCW
// 0 !HISTORY 2012-03-30 [PTadmin] Official Update 2012-01
// 
// 
// 2 24 1 1 1 -1 1 1
  [2,24,1,1,1,-1,1,1],
// 2 24 -1 1 1 -1 1 -1
  [2,24,-1,1,1,-1,1,-1],
// 2 24 -1 1 -1 1 1 -1
  [2,24,-1,1,-1,1,1,-1],
// 2 24 1 1 -1 1 1 1
  [2,24,1,1,-1,1,1,1],
// 2 24 1 0 1 -1 0 1
  [2,24,1,0,1,-1,0,1],
// 2 24 -1 0 1 -1 0 -1
  [2,24,-1,0,1,-1,0,-1],
// 2 24 -1 0 -1 1 0 -1
  [2,24,-1,0,-1,1,0,-1],
// 2 24 1 0 -1 1 0 1
  [2,24,1,0,-1,1,0,1],
// 2 24 1 0 1 1 1 1
  [2,24,1,0,1,1,1,1],
// 2 24 -1 0 1 -1 1 1
  [2,24,-1,0,1,-1,1,1],
// 2 24 1 0 -1 1 1 -1
  [2,24,1,0,-1,1,1,-1],
// 2 24 -1 0 -1 -1 1 -1
  [2,24,-1,0,-1,-1,1,-1],
// 4 16 -1 1 1 1 1 1 1 1 -1 -1 1 -1
  [4,16,-1,1,1,1,1,1,1,1,-1,-1,1,-1],
// 4 16 -1 1 1 -1 0 1 1 0 1 1 1 1
  [4,16,-1,1,1,-1,0,1,1,0,1,1,1,1],
// 4 16 -1 1 -1 -1 0 -1 -1 0 1 -1 1 1
  [4,16,-1,1,-1,-1,0,-1,-1,0,1,-1,1,1],
// 4 16 1 1 -1 1 0 -1 -1 0 -1 -1 1 -1
  [4,16,1,1,-1,1,0,-1,-1,0,-1,-1,1,-1],
// 4 16 1 1 1 1 0 1 1 0 -1 1 1 -1
  [4,16,1,1,1,1,0,1,1,0,-1,1,1,-1],
];
module ldraw_lib__box5(step=0, col=false, unit=2/5, alt=false, line=0.2, solid=!$preview)
    makepoly(ldraw_lib__box5(solid), step=step, col=col, unit=unit, alt=alt, line=line, solid=solid);
ldraw_lib__box5(line=0.2);
// file: ../p/box4t.scad
use <../lib.scad>
$fa=1; $fs=0.2;
function ldraw_lib__box4t(realsolid=false) = [
// 0 Box with 4 Adjacent Faces and All Edges
// 0 Name: box4t.dat
// 0 Author: Tore Eriksson [Tore_Eriksson]
// 0 !LDRAW_ORG Primitive UPDATE 2003-02
// 0 !LICENSE Licensed under CC BY 2.0 and CC BY 4.0 : see CAreadme.txt
// 
// 0 BFC CERTIFY CCW
  [0,"BFC","CERTIFY"],
  [0,"BFC","CCW"],
// 
// 0 !HISTORY 1997-09-29 [PTadmin] Official Update 1997-15
// 0 !HISTORY 2002-08-31 [izanette] Modified with WINDZ for BFC compliance
// 0 !HISTORY 2003-08-01 [PTadmin] Official Update 2003-02
// 0 !HISTORY 2007-06-24 [PTadmin] Header formatted for Contributor Agreement
// 0 !HISTORY 2008-07-01 [PTadmin] Official Update 2008-01
// 
// 
// 2 24 1 1 1 -1 1 1
  [2,24,1,1,1,-1,1,1],
// 2 24 -1 1 1 -1 1 -1
  [2,24,-1,1,1,-1,1,-1],
// 2 24 -1 1 -1 1 1 -1
  [2,24,-1,1,-1,1,1,-1],
// 2 24 1 1 -1 1 1 1
  [2,24,1,1,-1,1,1,1],
// 2 24 1 0 1 -1 0 1
  [2,24,1,0,1,-1,0,1],
// 2 24 -1 0 1 -1 0 -1
  [2,24,-1,0,1,-1,0,-1],
// 2 24 -1 0 -1 1 0 -1
  [2,24,-1,0,-1,1,0,-1],
// 2 24 1 0 -1 1 0 1
  [2,24,1,0,-1,1,0,1],
// 2 24 1 0 1 1 1 1
  [2,24,1,0,1,1,1,1],
// 2 24 -1 0 1 -1 1 1
  [2,24,-1,0,1,-1,1,1],
// 2 24 1 0 -1 1 1 -1
  [2,24,1,0,-1,1,1,-1],
// 2 24 -1 0 -1 -1 1 -1
  [2,24,-1,0,-1,-1,1,-1],
// 4 16 1 1 1 1 1 -1 -1 1 -1 -1 1 1
  [4,16,1,1,1,1,1,-1,-1,1,-1,-1,1,1],
// 4 16 1 1 1 -1 1 1 -1 0 1 1 0 1
  [4,16,1,1,1,-1,1,1,-1,0,1,1,0,1],
// 4 16 -1 1 1 -1 1 -1 -1 0 -1 -1 0 1
  [4,16,-1,1,1,-1,1,-1,-1,0,-1,-1,0,1],
// 0 4 16 -1 1 -1 -1 0 -1 1 0 -1 1 1 -1
// 4 16 1 1 -1 1 1 1 1 0 1 1 0 -1
  [4,16,1,1,-1,1,1,1,1,0,1,1,0,-1],
// 0
];
module ldraw_lib__box4t(step=0, col=false, unit=2/5, alt=false, line=0.2, solid=!$preview)
    makepoly(ldraw_lib__box4t(solid), step=step, col=col, unit=unit, alt=alt, line=line, solid=solid);
ldraw_lib__box4t(line=0.2);
// file: 3004.scad
use <../lib.scad>
use <s/3004s01.scad>
$fa=1; $fs=0.2;
function ldraw_lib__3004(realsolid=false) = [
// 0 Brick  1 x  2
// 0 Name: 3004.dat
// 0 Author: James Jessiman
// 0 !LDRAW_ORG Part UPDATE 2022-05
// 0 !LICENSE Licensed under CC BY 2.0 and CC BY 4.0 : see CAreadme.txt
// 
// 0 BFC CERTIFY CCW
  [0,"BFC","CERTIFY"],
  [0,"BFC","CCW"],
// 
// 0 !HISTORY 2001-10-26 [PTadmin] Official Update 2001-01
// 0 !HISTORY 2002-05-07 {unknown} BFC Certification
// 0 !HISTORY 2002-06-11 [PTadmin] Official Update 2002-03
// 0 !HISTORY 2007-05-07 [PTadmin] Header formatted for Contributor Agreement
// 0 !HISTORY 2008-07-01 [PTadmin] Official Update 2008-01
// 0 !HISTORY 2022-08-04 [MagFors] Using subfile
// 0 !HISTORY 2022-09-15 [PTadmin] Official Update 2022-05
// 
// 
// 1 16 0 0 0 1 0 0 0 1 0 0 0 1 s\3004s01.dat
  [1,16,0,0,0,1,0,0,0,1,0,0,0,1, ldraw_lib__s__3004s01(realsolid)],
// 4 16 -20 24 -10 20 24 -10 20 0 -10 -20 0 -10
  [4,16,-20,24,-10,20,24,-10,20,0,-10,-20,0,-10],
];
module ldraw_lib__3004(step=0, col=false, unit=2/5, alt=false, line=0.2, solid=!$preview)
    makepoly(ldraw_lib__3004(solid), step=step, col=col, unit=unit, alt=alt, line=line, solid=solid);
ldraw_lib__3004(line=0.2);
// file: s/3005s01.scad
use <../../lib.scad>
use <../../p/box4t.scad>
use <../../p/box5.scad>
use <../../p/stud.scad>
$fa=1; $fs=0.2;
function ldraw_lib__s__3005s01(realsolid=false) = [
// 0 ~Brick  1 x  1 without Front Face
// 0 Name: s\3005s01.dat
// 0 Author: John Riley [jriley]
// 0 !LDRAW_ORG Subpart UPDATE 2004-01
// 0 !LICENSE Licensed under CC BY 2.0 and CC BY 4.0 : see CAreadme.txt
// 
// 0 BFC CERTIFY CCW
  [0,"BFC","CERTIFY"],
  [0,"BFC","CCW"],
// 
// 0 !HISTORY 2003-09-07 [jriley] BFCed & Subfiled
// 0 !HISTORY 2004-03-02 [PTadmin] Official Update 2004-01
// 0 !HISTORY 2007-08-29 [PTadmin] Header formatted for Contributor Agreement
// 0 !HISTORY 2008-07-01 [PTadmin] Official Update 2008-01
// 
// 
// 0 BFC INVERTNEXT
  [0,"BFC","INVERTNEXT"],
// 1 16 0 24 0 0 0 6 0 -20 0 -6 0 0 box5.dat
  [1,16,0,24,0,0,0,6,0,-20,0,-6,0,0, ldraw_lib__box5(realsolid)],
// 4 16 10 24 -10 6 24 -6 6 24 6 10 24 10
  [4,16,10,24,-10,6,24,-6,6,24,6,10,24,10],
// 4 16 10 24 10 6 24 6 -6 24 6 -10 24 10
  [4,16,10,24,10,6,24,6,-6,24,6,-10,24,10],
// 4 16 -10 24 10 -6 24 6 -6 24 -6 -10 24 -10
  [4,16,-10,24,10,-6,24,6,-6,24,-6,-10,24,-10],
// 4 16 -10 24 -10 -6 24 -6 6 24 -6 10 24 -10
  [4,16,-10,24,-10,-6,24,-6,6,24,-6,10,24,-10],
// 1 16 0 24 0 10 0 0 0 -24 0 0 0 10 box4t.dat
  [1,16,0,24,0,10,0,0,0,-24,0,0,0,10, ldraw_lib__box4t(realsolid)],
// 1 16 0 0 0 0 0 1 0 1 0 -1 0 0 stud.dat
  [1,16,0,0,0,0,0,1,0,1,0,-1,0,0, ldraw_lib__stud(realsolid)],
// 0
];
module ldraw_lib__s__3005s01(step=0, col=false, unit=2/5, alt=false, line=0.2, solid=!$preview)
    makepoly(ldraw_lib__s__3005s01(solid), step=step, col=col, unit=unit, alt=alt, line=line, solid=solid);
ldraw_lib__s__3005s01(line=0.2);
// main file
use <../lib.scad>
use <s/3005s01.scad>
$fa=1; $fs=0.2;
function ldraw_lib__3005pt4(realsolid=false) = [
// 0 Brick  1 x  1 with Blue "4" Pattern
// 0 Name: 3005pt4.dat
// 0 Author: Tore Eriksson [Tore_Eriksson]
// 0 !LDRAW_ORG Part UPDATE 2014-02
// 0 !LICENSE Licensed under CC BY 2.0 and CC BY 4.0 : see CAreadme.txt
// 
// 0 BFC CERTIFY CCW
  [0,"BFC","CERTIFY"],
  [0,"BFC","CCW"],
// 
// 0 !HISTORY 2003-12-09 [Steffen] made use of existing subfile
// 0 !HISTORY 2004-04-22 [PTadmin] Official Update 2004-02
// 0 !HISTORY 2007-05-11 [PTadmin] Header formatted for Contributor Agreement
// 0 !HISTORY 2008-07-01 [PTadmin] Official Update 2008-01
// 0 !HISTORY 2014-12-18 [Holly-Wood] Fixed T-Junction, BFCed
// 0 !HISTORY 2014-12-23 [PTadmin] Official Update 2014-02
// 
// 
// 0 // Pattern
// 
// 3 1 4 5 -10 1.5 5 -10 2 7.5 -10
  [3,1,4,5,-10,1.5,5,-10,2,7.5,-10],
// 4 1 4 14 -10 4 5 -10 2 7.5 -10 2 14 -10
  [4,1,4,14,-10,4,5,-10,2,7.5,-10,2,14,-10],
// 4 1 4 14 -10 2 14 -10 2 16 -10 4 16 -10
  [4,1,4,14,-10,2,14,-10,2,16,-10,4,16,-10],
// 4 1 4 14 -10 4 16 -10 6 16 -10 6 14 -10
  [4,1,4,14,-10,4,16,-10,6,16,-10,6,14,-10],
// 4 1 4 16 -10 2 16 -10 2 18.5 -10 4 18.5 -10
  [4,1,4,16,-10,2,16,-10,2,18.5,-10,4,18.5,-10],
// 3 1 2 14 -10 -3.5 14 -10 2 16 -10
  [3,1,2,14,-10,-3.5,14,-10,2,16,-10],
// 4 1 -3.5 14 -10 -6 14 -10 -6 16 -10 2 16 -10
  [4,1,-3.5,14,-10,-6,14,-10,-6,16,-10,2,16,-10],
// 4 1 1.5 5 -10 -6 14 -10 -3.5 14 -10 2 7.5 -10
  [4,1,1.5,5,-10,-6,14,-10,-3.5,14,-10,2,7.5,-10],
// 4 16 -10 12 -10 -6 14 -10 1.5 5 -10 -10 0 -10
  [4,16,-10,12,-10,-6,14,-10,1.5,5,-10,-10,0,-10],
// 4 16 -10 0 -10 1.5 5 -10 4 5 -10 10 0 -10
  [4,16,-10,0,-10,1.5,5,-10,4,5,-10,10,0,-10],
// 4 16 10 0 -10 4 5 -10 4 14 -10 6 14 -10
  [4,16,10,0,-10,4,5,-10,4,14,-10,6,14,-10],
// 4 16 10 0 -10 6 14 -10 6 16 -10 10 24 -10
  [4,16,10,0,-10,6,14,-10,6,16,-10,10,24,-10],
// 4 16 10 24 -10 6 16 -10 4 16 -10 4 18.5 -10
  [4,16,10,24,-10,6,16,-10,4,16,-10,4,18.5,-10],
// 4 16 10 24 -10 4 18.5 -10 2 18.5 -10 -10 24 -10
  [4,16,10,24,-10,4,18.5,-10,2,18.5,-10,-10,24,-10],
// 4 16 -10 24 -10 2 18.5 -10 2 16 -10 -6 16 -10
  [4,16,-10,24,-10,2,18.5,-10,2,16,-10,-6,16,-10],
// 4 16 -10 24 -10 -6 16 -10 -6 14 -10 -10 12 -10
  [4,16,-10,24,-10,-6,16,-10,-6,14,-10,-10,12,-10],
// 3 16 2 7.5 -10 -3.5 14 -10 2 14 -10
  [3,16,2,7.5,-10,-3.5,14,-10,2,14,-10],
// 
// 0 // Subfile
// 1 16 0 0 0 1 0 0 0 1 0 0 0 1 s\3005s01.dat
  [1,16,0,0,0,1,0,0,0,1,0,0,0,1, ldraw_lib__s__3005s01(realsolid)],
];
module ldraw_lib__3005pt4(step=0, col=false, unit=2/5, alt=false, line=0.2, solid=!$preview)
    makepoly(ldraw_lib__3005pt4(solid), step=step, col=col, unit=unit, alt=alt, line=line, solid=solid);
ldraw_lib__3005pt4(line=0.2);
